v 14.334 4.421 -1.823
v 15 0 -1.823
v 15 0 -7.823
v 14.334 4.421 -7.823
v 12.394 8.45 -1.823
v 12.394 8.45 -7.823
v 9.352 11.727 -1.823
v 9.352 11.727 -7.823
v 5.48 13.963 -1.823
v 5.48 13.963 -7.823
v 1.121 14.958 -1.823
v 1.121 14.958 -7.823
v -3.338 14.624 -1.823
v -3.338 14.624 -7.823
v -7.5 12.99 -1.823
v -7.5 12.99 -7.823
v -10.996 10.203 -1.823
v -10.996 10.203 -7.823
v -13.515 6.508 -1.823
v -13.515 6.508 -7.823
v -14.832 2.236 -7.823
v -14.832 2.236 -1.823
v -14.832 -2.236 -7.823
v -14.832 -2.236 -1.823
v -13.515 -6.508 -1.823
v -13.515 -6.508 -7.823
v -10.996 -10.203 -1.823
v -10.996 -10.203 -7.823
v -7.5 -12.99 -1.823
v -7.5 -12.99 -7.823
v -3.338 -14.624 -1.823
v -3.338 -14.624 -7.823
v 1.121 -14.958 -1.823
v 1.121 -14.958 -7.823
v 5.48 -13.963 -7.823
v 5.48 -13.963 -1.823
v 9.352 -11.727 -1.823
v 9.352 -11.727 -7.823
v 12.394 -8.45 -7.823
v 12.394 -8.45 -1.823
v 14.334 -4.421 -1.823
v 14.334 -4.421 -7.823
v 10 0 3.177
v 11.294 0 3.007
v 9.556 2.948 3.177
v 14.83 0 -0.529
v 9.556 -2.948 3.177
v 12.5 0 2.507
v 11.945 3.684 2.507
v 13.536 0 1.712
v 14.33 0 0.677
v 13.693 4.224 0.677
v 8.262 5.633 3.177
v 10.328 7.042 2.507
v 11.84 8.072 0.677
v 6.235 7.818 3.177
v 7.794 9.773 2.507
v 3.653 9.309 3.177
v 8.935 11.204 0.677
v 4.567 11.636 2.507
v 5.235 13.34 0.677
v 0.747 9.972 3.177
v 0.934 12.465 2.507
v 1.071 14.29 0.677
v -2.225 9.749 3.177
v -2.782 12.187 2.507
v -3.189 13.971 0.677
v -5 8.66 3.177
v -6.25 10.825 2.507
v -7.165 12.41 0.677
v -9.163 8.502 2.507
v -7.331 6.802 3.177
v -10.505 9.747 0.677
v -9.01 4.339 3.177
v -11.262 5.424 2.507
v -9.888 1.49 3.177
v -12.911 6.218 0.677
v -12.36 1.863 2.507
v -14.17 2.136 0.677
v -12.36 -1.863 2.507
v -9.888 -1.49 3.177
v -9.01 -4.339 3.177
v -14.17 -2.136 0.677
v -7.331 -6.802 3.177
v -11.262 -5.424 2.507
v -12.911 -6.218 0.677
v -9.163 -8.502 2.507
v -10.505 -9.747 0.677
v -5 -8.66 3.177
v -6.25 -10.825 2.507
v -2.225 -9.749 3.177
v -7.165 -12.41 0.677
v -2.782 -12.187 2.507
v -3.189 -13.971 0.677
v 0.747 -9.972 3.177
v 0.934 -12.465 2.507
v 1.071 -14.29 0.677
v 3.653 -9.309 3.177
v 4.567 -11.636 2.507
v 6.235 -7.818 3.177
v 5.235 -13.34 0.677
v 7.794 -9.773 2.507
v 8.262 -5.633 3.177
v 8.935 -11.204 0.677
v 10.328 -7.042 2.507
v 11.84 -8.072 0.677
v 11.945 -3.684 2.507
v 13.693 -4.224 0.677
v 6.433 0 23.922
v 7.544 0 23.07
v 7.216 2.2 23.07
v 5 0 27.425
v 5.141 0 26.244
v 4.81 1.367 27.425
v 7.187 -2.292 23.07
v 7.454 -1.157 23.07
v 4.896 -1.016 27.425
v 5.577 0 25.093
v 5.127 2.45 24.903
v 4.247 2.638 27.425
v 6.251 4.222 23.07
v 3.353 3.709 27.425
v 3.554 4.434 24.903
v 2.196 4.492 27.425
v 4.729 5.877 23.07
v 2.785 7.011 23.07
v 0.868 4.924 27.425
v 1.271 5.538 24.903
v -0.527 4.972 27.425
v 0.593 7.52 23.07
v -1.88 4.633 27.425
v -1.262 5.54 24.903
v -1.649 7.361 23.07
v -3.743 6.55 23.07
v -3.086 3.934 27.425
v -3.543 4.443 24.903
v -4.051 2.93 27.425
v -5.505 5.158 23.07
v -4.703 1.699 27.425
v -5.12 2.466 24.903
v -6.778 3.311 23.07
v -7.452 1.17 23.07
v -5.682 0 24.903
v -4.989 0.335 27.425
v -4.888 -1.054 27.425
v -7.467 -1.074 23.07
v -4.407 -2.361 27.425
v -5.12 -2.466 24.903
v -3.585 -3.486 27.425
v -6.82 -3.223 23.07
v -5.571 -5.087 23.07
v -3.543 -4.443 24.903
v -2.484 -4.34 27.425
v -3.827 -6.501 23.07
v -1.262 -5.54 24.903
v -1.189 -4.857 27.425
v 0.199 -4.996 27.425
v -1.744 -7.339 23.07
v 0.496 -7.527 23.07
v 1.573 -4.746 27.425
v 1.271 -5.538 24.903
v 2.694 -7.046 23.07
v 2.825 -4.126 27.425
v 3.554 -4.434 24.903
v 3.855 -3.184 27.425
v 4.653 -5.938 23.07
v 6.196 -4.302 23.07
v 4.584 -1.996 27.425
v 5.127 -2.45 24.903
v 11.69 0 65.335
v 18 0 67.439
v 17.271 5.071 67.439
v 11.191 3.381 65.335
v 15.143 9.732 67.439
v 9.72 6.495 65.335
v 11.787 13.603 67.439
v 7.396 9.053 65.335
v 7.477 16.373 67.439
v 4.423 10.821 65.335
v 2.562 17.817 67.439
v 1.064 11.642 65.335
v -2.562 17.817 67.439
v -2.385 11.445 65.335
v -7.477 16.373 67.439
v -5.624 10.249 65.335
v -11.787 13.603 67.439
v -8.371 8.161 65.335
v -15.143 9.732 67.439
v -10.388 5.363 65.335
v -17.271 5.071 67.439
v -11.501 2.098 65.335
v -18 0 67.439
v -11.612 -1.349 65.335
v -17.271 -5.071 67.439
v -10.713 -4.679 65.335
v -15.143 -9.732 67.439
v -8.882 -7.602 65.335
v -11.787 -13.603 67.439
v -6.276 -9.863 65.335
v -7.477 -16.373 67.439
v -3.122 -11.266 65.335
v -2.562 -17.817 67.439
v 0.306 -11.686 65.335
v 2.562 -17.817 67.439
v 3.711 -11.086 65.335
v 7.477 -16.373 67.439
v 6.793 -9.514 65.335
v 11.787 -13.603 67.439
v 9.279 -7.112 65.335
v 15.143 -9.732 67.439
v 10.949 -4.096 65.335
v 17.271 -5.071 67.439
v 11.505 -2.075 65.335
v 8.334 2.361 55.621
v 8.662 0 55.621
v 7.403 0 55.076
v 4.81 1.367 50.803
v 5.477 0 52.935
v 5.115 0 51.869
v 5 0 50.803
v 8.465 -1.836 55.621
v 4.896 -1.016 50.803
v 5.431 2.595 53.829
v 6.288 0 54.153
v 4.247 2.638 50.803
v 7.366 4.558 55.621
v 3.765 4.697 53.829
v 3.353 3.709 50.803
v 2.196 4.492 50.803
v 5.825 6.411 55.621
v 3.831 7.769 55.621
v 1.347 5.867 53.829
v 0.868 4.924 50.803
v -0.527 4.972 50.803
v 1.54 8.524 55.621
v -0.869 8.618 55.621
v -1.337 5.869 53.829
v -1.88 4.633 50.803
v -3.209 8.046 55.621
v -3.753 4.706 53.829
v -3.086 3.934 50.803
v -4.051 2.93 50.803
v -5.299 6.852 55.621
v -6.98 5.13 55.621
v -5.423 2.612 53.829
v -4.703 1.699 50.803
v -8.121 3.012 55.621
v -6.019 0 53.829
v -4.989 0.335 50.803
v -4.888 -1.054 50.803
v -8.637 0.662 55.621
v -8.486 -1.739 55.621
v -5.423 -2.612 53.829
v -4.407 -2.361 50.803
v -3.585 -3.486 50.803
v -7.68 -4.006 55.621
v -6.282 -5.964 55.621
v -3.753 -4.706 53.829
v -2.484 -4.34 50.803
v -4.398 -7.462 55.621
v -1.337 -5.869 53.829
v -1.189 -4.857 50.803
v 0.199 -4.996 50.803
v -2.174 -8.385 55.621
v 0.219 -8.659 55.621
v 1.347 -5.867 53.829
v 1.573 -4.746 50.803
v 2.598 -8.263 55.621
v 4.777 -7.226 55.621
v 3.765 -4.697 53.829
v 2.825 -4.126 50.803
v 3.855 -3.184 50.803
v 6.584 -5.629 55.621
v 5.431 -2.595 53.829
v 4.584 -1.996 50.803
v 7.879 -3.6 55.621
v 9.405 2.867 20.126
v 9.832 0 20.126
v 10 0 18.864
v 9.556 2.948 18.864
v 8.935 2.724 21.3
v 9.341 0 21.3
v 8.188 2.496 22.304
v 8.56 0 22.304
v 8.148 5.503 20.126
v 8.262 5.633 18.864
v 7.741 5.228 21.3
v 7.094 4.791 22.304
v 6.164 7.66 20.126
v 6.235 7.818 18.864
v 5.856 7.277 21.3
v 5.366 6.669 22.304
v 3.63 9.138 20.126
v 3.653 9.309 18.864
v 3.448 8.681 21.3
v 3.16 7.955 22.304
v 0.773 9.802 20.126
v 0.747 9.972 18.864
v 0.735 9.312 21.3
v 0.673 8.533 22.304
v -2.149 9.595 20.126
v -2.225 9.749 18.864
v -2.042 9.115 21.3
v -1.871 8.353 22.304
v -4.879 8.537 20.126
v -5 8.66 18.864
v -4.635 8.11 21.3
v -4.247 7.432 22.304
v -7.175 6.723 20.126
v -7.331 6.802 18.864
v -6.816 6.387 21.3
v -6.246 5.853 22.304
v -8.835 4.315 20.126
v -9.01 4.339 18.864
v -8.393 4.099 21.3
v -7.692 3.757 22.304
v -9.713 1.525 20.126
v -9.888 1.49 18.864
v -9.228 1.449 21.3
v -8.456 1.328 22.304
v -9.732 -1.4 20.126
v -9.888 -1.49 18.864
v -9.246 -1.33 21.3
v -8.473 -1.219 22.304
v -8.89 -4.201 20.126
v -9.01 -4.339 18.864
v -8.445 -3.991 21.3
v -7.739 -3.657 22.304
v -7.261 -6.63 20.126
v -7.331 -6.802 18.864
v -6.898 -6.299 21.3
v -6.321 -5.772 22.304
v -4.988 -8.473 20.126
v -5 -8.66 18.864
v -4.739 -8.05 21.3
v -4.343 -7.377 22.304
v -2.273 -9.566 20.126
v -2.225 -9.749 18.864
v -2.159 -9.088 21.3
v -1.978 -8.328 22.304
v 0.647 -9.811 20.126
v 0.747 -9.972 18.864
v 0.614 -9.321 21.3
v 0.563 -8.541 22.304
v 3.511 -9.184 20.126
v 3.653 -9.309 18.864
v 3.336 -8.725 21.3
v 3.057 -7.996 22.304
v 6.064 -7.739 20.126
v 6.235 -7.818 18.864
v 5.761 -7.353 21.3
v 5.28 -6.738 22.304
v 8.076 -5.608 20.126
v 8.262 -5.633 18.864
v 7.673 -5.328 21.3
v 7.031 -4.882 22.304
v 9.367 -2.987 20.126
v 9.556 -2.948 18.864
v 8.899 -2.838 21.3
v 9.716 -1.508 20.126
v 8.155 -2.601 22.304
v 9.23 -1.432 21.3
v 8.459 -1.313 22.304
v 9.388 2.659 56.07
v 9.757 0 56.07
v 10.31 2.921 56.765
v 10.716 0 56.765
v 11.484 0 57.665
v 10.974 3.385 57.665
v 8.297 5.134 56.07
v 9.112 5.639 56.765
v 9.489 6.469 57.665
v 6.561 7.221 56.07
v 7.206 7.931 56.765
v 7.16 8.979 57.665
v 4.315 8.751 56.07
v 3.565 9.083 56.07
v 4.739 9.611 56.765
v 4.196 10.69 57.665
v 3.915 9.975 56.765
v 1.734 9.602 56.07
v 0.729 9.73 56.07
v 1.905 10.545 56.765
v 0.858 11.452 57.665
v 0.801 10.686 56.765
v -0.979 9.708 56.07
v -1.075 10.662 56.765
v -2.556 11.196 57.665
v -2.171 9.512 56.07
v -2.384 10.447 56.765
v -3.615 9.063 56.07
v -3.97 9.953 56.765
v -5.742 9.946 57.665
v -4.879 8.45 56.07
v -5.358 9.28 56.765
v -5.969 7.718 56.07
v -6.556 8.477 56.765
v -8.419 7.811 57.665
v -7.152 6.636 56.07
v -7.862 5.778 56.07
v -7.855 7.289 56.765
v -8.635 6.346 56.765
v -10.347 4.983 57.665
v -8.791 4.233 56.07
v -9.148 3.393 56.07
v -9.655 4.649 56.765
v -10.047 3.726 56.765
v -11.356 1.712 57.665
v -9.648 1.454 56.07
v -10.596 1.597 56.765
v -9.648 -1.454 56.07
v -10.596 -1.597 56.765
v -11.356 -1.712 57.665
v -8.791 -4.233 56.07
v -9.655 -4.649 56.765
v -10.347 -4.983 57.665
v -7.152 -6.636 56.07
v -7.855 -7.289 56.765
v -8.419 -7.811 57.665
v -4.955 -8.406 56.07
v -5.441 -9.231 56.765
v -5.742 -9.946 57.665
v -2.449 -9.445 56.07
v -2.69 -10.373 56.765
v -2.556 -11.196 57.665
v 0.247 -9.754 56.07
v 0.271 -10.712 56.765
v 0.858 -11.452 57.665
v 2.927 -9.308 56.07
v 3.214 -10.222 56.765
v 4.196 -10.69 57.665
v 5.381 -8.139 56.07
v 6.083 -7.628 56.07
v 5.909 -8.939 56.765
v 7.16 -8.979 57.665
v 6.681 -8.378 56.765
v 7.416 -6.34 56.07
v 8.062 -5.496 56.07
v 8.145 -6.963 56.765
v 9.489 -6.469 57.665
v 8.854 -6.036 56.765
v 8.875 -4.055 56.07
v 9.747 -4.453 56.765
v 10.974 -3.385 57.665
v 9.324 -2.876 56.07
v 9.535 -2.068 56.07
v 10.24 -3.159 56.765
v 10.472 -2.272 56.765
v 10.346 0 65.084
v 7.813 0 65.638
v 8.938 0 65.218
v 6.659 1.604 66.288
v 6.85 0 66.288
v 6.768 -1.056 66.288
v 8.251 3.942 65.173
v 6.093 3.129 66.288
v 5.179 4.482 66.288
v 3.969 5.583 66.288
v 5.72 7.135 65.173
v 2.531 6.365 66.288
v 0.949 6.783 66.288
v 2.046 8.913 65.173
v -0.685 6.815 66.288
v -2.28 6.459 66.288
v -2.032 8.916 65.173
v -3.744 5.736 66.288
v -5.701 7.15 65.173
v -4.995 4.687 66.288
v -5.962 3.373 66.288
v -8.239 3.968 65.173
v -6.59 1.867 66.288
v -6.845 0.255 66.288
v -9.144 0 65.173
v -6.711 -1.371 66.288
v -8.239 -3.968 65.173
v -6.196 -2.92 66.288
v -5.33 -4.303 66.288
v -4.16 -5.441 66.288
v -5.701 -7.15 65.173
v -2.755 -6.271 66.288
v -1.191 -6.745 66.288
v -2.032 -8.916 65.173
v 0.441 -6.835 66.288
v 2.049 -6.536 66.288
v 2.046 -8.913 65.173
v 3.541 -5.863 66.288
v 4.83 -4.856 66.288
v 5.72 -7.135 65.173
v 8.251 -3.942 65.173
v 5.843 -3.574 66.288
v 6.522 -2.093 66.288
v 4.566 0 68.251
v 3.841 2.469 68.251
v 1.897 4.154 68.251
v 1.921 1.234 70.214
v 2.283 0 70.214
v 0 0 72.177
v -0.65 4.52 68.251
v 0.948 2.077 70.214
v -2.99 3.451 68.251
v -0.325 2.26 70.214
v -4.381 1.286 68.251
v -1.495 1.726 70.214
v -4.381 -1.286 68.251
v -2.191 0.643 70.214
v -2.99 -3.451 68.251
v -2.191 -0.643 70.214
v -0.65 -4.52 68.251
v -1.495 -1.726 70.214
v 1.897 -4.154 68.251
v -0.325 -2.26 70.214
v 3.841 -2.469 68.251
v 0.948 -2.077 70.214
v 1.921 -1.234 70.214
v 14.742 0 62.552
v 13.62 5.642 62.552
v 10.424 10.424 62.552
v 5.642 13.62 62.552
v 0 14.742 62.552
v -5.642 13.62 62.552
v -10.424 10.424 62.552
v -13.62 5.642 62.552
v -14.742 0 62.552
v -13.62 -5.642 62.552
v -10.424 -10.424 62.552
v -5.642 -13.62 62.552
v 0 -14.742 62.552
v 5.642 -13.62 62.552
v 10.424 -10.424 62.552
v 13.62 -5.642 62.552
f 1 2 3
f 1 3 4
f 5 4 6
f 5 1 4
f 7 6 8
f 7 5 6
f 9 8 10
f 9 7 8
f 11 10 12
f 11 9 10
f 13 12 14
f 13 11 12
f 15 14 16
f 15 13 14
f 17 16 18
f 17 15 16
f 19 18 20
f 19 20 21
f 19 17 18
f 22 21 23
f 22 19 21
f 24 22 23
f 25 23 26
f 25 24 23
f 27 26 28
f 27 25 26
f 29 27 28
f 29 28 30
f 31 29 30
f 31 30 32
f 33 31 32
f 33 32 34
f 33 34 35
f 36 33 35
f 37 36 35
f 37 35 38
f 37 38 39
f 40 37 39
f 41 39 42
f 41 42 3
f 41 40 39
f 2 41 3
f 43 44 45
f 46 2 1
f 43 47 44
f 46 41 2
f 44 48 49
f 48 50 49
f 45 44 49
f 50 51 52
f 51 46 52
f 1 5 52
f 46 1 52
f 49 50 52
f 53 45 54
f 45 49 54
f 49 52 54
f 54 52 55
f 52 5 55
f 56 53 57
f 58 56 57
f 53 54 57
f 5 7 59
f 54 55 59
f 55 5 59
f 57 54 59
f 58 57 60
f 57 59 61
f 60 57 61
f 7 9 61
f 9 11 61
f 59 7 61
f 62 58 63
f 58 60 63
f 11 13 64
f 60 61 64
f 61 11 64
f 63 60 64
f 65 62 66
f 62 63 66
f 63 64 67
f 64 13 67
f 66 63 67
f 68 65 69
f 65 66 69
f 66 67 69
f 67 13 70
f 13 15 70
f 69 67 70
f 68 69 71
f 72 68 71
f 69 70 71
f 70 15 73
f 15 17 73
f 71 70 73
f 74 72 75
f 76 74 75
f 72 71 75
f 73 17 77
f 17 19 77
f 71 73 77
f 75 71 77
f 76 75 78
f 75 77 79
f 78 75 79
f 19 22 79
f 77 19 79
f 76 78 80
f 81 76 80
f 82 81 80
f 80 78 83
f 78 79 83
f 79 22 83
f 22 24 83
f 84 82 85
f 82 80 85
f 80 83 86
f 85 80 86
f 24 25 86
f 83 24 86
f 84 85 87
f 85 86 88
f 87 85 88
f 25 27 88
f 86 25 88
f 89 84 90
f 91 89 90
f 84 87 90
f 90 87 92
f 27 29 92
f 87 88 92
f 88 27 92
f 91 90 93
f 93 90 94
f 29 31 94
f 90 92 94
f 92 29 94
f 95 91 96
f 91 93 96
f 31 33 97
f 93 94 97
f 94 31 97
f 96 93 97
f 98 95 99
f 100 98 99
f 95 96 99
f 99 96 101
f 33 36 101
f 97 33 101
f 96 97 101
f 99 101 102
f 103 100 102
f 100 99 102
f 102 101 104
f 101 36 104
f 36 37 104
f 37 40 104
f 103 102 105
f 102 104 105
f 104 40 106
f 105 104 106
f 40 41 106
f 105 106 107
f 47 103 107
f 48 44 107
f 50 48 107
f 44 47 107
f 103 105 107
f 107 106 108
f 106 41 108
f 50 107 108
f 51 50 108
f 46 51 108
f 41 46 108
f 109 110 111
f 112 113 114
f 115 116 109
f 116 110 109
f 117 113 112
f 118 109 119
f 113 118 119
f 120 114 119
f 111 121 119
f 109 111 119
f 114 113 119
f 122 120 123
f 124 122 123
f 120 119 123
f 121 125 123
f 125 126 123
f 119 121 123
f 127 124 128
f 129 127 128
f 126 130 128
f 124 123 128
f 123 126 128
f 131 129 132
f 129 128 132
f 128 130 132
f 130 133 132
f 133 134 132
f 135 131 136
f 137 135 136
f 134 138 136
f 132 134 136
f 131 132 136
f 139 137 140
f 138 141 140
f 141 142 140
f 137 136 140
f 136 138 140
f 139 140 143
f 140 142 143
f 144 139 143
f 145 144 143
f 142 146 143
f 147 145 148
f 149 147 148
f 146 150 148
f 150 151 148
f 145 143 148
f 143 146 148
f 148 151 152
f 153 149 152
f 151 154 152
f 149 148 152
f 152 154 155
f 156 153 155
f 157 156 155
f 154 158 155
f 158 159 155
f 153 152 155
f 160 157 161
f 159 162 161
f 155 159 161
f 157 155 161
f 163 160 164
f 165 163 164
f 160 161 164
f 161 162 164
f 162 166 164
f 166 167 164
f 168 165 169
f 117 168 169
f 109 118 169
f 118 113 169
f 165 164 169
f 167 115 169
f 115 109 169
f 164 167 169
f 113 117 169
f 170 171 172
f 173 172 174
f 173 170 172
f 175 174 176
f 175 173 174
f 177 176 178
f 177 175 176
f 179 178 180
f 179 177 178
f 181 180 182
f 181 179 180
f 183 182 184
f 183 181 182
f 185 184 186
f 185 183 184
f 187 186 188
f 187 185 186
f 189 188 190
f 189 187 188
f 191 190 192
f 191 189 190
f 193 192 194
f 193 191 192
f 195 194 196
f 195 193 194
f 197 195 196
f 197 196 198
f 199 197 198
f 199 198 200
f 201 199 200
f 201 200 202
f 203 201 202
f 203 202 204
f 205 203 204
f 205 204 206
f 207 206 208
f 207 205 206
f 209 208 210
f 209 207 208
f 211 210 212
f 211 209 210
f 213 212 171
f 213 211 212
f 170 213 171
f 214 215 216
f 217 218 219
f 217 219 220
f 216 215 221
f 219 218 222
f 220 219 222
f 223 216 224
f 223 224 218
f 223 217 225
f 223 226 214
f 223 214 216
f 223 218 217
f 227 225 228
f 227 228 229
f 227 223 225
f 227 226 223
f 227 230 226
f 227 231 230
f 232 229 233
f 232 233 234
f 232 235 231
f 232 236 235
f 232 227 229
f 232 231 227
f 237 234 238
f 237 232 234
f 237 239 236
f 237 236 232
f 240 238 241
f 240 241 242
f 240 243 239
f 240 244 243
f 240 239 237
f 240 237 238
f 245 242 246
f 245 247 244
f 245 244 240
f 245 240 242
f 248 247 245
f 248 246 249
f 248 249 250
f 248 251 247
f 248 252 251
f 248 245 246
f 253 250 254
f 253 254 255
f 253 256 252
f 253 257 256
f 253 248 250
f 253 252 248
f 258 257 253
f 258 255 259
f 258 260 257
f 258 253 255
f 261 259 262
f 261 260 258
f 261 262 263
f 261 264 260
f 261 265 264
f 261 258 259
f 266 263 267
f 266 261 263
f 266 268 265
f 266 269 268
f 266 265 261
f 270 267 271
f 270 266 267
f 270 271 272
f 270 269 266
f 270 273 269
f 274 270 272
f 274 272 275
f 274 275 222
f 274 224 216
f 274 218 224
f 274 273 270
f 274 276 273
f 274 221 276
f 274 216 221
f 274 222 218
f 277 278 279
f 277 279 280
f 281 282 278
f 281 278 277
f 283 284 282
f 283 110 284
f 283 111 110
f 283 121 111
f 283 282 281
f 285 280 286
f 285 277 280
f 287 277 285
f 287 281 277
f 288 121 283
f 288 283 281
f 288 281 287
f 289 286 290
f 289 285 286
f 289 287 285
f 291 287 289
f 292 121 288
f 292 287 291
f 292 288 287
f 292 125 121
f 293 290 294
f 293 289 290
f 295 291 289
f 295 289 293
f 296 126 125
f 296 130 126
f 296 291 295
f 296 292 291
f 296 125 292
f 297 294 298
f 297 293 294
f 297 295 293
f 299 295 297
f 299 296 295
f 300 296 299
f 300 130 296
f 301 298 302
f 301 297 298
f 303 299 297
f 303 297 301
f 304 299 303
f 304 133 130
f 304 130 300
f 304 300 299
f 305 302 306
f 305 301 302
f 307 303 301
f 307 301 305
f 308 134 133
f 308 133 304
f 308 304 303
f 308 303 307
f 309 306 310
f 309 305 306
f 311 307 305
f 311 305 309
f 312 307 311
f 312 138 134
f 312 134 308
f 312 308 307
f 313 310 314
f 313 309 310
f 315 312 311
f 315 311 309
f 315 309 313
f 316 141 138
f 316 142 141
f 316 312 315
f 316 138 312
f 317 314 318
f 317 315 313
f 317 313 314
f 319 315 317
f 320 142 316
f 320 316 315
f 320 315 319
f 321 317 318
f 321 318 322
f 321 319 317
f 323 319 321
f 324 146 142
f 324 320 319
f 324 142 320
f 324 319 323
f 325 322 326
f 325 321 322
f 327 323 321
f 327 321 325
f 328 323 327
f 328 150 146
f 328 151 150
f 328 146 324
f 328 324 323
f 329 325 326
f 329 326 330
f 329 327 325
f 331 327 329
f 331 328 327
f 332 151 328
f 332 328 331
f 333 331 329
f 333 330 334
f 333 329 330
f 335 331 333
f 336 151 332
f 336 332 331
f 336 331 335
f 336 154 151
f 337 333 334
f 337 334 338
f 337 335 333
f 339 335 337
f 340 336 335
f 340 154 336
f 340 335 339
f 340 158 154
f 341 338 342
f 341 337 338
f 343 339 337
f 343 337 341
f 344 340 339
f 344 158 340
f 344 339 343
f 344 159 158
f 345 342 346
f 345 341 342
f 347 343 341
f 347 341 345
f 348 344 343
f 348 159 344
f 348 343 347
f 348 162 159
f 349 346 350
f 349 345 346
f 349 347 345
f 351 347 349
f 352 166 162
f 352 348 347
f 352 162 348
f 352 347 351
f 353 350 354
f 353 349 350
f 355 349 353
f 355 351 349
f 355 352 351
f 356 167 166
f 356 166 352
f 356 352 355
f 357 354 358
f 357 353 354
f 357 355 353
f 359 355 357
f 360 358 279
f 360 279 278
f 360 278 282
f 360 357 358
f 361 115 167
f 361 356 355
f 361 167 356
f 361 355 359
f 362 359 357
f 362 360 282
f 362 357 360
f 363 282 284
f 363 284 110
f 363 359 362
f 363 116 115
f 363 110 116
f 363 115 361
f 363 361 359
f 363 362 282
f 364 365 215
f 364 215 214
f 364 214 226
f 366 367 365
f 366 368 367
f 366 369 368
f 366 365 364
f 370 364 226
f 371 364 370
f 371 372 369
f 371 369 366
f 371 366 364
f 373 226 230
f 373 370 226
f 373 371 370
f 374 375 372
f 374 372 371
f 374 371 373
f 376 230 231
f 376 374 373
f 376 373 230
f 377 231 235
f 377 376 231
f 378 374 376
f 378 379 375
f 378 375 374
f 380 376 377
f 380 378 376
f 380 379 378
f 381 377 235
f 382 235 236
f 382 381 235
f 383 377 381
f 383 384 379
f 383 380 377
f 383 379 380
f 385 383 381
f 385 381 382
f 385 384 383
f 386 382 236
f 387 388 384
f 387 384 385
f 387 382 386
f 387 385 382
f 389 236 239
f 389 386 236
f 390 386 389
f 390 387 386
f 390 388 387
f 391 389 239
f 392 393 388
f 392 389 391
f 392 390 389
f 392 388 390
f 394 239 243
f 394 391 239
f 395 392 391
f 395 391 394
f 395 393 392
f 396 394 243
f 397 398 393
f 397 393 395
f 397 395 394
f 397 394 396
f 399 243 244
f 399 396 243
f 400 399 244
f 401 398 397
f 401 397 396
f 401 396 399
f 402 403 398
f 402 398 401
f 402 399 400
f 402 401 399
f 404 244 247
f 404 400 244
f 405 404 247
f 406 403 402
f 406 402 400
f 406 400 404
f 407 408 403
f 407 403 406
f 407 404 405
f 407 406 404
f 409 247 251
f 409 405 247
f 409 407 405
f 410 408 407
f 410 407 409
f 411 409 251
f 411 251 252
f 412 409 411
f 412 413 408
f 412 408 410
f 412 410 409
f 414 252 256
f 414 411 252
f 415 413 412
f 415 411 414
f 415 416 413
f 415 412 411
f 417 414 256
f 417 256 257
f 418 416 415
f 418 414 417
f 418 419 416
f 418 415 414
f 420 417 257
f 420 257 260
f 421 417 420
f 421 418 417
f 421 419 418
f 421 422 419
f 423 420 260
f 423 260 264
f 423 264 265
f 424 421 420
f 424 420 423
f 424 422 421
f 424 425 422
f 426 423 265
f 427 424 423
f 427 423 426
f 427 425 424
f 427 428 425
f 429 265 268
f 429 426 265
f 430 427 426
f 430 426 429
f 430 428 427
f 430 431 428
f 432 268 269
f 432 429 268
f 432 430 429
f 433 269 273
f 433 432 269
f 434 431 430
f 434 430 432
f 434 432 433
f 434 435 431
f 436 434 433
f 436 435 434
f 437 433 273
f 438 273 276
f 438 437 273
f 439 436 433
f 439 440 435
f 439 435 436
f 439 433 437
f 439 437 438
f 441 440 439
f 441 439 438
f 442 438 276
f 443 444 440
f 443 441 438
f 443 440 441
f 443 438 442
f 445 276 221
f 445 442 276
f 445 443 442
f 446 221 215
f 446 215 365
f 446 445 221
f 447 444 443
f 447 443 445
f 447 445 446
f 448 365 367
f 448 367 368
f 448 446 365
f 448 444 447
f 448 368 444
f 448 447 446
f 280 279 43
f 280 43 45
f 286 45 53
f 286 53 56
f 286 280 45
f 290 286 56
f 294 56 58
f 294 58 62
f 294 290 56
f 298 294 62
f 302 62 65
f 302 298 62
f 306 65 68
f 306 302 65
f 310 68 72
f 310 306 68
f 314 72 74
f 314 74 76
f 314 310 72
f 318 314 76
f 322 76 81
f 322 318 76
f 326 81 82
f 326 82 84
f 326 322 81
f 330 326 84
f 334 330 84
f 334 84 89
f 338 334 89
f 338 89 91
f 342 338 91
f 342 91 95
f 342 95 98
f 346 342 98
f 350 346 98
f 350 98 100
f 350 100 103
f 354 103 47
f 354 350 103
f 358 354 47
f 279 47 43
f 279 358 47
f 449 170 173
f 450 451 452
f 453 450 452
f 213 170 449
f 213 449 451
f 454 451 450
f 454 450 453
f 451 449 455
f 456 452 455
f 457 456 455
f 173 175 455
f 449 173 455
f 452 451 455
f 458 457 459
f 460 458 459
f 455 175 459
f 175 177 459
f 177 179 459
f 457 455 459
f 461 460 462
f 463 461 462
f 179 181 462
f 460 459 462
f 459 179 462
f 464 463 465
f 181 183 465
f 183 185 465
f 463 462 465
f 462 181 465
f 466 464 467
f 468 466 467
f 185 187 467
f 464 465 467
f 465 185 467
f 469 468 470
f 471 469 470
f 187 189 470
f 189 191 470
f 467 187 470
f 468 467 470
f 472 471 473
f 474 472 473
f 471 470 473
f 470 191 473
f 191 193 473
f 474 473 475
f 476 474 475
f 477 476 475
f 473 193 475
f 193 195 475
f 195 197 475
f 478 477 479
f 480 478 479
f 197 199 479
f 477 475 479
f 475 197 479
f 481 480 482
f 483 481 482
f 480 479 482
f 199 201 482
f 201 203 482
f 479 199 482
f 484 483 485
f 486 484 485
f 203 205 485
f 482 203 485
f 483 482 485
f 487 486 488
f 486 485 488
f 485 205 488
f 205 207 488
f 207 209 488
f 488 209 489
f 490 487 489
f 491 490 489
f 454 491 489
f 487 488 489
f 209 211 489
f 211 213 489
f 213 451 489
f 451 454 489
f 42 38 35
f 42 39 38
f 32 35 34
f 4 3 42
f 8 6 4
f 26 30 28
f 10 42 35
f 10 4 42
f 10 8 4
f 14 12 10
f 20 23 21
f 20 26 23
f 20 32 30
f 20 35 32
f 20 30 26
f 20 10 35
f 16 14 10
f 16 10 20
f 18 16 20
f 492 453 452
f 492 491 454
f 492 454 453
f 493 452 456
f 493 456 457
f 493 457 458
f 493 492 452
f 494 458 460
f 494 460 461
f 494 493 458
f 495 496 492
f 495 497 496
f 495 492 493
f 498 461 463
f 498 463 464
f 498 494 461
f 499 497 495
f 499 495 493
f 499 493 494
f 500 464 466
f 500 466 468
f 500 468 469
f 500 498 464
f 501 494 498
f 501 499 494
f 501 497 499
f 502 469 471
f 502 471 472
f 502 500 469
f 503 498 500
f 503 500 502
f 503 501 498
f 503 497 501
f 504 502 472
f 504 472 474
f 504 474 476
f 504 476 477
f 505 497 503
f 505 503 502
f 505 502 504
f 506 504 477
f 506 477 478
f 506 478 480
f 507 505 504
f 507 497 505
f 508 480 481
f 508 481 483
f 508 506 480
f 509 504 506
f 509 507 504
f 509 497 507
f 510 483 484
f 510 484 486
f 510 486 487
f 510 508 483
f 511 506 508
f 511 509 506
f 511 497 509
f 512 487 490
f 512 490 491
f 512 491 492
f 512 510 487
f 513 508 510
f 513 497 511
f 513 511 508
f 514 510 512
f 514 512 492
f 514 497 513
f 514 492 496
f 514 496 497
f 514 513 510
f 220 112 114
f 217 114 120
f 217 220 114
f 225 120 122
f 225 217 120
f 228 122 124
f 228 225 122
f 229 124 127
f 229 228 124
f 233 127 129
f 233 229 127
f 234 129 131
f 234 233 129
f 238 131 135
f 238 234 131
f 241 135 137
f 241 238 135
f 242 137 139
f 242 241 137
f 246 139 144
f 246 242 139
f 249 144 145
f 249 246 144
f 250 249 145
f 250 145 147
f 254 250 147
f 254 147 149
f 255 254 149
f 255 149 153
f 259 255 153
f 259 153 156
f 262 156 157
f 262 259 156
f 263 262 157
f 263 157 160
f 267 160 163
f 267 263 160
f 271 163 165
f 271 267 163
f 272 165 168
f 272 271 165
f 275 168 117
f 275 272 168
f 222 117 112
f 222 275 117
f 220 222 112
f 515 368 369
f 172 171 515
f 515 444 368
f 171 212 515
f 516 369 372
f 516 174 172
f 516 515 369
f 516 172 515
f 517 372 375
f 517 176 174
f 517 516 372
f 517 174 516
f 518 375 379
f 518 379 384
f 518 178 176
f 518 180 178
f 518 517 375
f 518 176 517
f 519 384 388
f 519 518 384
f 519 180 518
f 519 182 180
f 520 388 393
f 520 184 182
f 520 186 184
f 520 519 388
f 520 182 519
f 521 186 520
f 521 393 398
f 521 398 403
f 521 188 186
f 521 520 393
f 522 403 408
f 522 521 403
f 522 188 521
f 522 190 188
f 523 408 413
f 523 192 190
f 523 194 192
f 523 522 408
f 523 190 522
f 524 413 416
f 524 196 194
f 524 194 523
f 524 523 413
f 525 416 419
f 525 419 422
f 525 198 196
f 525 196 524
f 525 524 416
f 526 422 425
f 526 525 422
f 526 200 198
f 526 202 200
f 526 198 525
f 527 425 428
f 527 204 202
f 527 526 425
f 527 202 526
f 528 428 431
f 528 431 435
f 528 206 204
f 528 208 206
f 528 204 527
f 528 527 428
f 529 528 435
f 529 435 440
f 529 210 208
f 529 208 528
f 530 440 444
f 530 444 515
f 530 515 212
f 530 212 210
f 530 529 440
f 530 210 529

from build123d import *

# Parameters (mm, degrees)
F2_R = 4.8284271247
F3_R = 4.99999
F4_R = 5
F5_R = 5
F6_R = 5
F7_R = 5


# Not quite as in the source:
# - a fillet or chamfer is up to 0.001 mm smaller than in the source, because OpenCascade refuses the exact size


with BuildPart() as f1:
    # F0 (on Front) → F1 (revolve)
    with BuildSketch(Plane.XZ):
        Polygon((0, 55.4385791123), (0, -7.8231290636), (15, -7.8231290636), (15, 3.1768709364), (10, 3.1768709364), (10, 23.6928891391), (5, 23.6928891391), (5, 55.4385791123), (10, 55.4385791123), (18, 67.4385791123), (9, 64.4385791123), (0, 72.1768709364), (0, 61.4385791123), align=None)
    revolve(axis=Axis((0, 0, 26.8077250243), (0, 0, 1)))

    # F2
    f2_edges = [f1.edges().sort_by_distance(p)[0] for p in [
        (-10, 0, 23.692889),
    ]]
    fillet(f2_edges, radius=F2_R)

    # F3 (radius 5 in the source; OpenCascade refuses exactly that, so slightly less here)
    f3_edges = [f1.edges().sort_by_distance(p)[0] for p in [
        (-15, 0, 3.176871),
    ]]
    fillet(f3_edges, radius=F3_R)

    # F4
    f4_edges = [f1.edges().sort_by_distance(p)[0] for p in [
        (-5, 0, 23.692889),
    ]]
    fillet(f4_edges, radius=F4_R)

    # F5
    f5_edges = [f1.edges().sort_by_distance(p)[0] for p in [
        (-10, 0, 55.438579),
    ]]
    fillet(f5_edges, radius=F5_R)

    # F6
    f6_edges = [f1.edges().sort_by_distance(p)[0] for p in [
        (-9, 0, 64.438579),
    ]]
    fillet(f6_edges, radius=F6_R)

    # F7
    f7_edges = [f1.edges().sort_by_distance(p)[0] for p in [
        (-5, 0, 55.438579),
    ]]
    fillet(f7_edges, radius=F7_R)


solid = f1.part
